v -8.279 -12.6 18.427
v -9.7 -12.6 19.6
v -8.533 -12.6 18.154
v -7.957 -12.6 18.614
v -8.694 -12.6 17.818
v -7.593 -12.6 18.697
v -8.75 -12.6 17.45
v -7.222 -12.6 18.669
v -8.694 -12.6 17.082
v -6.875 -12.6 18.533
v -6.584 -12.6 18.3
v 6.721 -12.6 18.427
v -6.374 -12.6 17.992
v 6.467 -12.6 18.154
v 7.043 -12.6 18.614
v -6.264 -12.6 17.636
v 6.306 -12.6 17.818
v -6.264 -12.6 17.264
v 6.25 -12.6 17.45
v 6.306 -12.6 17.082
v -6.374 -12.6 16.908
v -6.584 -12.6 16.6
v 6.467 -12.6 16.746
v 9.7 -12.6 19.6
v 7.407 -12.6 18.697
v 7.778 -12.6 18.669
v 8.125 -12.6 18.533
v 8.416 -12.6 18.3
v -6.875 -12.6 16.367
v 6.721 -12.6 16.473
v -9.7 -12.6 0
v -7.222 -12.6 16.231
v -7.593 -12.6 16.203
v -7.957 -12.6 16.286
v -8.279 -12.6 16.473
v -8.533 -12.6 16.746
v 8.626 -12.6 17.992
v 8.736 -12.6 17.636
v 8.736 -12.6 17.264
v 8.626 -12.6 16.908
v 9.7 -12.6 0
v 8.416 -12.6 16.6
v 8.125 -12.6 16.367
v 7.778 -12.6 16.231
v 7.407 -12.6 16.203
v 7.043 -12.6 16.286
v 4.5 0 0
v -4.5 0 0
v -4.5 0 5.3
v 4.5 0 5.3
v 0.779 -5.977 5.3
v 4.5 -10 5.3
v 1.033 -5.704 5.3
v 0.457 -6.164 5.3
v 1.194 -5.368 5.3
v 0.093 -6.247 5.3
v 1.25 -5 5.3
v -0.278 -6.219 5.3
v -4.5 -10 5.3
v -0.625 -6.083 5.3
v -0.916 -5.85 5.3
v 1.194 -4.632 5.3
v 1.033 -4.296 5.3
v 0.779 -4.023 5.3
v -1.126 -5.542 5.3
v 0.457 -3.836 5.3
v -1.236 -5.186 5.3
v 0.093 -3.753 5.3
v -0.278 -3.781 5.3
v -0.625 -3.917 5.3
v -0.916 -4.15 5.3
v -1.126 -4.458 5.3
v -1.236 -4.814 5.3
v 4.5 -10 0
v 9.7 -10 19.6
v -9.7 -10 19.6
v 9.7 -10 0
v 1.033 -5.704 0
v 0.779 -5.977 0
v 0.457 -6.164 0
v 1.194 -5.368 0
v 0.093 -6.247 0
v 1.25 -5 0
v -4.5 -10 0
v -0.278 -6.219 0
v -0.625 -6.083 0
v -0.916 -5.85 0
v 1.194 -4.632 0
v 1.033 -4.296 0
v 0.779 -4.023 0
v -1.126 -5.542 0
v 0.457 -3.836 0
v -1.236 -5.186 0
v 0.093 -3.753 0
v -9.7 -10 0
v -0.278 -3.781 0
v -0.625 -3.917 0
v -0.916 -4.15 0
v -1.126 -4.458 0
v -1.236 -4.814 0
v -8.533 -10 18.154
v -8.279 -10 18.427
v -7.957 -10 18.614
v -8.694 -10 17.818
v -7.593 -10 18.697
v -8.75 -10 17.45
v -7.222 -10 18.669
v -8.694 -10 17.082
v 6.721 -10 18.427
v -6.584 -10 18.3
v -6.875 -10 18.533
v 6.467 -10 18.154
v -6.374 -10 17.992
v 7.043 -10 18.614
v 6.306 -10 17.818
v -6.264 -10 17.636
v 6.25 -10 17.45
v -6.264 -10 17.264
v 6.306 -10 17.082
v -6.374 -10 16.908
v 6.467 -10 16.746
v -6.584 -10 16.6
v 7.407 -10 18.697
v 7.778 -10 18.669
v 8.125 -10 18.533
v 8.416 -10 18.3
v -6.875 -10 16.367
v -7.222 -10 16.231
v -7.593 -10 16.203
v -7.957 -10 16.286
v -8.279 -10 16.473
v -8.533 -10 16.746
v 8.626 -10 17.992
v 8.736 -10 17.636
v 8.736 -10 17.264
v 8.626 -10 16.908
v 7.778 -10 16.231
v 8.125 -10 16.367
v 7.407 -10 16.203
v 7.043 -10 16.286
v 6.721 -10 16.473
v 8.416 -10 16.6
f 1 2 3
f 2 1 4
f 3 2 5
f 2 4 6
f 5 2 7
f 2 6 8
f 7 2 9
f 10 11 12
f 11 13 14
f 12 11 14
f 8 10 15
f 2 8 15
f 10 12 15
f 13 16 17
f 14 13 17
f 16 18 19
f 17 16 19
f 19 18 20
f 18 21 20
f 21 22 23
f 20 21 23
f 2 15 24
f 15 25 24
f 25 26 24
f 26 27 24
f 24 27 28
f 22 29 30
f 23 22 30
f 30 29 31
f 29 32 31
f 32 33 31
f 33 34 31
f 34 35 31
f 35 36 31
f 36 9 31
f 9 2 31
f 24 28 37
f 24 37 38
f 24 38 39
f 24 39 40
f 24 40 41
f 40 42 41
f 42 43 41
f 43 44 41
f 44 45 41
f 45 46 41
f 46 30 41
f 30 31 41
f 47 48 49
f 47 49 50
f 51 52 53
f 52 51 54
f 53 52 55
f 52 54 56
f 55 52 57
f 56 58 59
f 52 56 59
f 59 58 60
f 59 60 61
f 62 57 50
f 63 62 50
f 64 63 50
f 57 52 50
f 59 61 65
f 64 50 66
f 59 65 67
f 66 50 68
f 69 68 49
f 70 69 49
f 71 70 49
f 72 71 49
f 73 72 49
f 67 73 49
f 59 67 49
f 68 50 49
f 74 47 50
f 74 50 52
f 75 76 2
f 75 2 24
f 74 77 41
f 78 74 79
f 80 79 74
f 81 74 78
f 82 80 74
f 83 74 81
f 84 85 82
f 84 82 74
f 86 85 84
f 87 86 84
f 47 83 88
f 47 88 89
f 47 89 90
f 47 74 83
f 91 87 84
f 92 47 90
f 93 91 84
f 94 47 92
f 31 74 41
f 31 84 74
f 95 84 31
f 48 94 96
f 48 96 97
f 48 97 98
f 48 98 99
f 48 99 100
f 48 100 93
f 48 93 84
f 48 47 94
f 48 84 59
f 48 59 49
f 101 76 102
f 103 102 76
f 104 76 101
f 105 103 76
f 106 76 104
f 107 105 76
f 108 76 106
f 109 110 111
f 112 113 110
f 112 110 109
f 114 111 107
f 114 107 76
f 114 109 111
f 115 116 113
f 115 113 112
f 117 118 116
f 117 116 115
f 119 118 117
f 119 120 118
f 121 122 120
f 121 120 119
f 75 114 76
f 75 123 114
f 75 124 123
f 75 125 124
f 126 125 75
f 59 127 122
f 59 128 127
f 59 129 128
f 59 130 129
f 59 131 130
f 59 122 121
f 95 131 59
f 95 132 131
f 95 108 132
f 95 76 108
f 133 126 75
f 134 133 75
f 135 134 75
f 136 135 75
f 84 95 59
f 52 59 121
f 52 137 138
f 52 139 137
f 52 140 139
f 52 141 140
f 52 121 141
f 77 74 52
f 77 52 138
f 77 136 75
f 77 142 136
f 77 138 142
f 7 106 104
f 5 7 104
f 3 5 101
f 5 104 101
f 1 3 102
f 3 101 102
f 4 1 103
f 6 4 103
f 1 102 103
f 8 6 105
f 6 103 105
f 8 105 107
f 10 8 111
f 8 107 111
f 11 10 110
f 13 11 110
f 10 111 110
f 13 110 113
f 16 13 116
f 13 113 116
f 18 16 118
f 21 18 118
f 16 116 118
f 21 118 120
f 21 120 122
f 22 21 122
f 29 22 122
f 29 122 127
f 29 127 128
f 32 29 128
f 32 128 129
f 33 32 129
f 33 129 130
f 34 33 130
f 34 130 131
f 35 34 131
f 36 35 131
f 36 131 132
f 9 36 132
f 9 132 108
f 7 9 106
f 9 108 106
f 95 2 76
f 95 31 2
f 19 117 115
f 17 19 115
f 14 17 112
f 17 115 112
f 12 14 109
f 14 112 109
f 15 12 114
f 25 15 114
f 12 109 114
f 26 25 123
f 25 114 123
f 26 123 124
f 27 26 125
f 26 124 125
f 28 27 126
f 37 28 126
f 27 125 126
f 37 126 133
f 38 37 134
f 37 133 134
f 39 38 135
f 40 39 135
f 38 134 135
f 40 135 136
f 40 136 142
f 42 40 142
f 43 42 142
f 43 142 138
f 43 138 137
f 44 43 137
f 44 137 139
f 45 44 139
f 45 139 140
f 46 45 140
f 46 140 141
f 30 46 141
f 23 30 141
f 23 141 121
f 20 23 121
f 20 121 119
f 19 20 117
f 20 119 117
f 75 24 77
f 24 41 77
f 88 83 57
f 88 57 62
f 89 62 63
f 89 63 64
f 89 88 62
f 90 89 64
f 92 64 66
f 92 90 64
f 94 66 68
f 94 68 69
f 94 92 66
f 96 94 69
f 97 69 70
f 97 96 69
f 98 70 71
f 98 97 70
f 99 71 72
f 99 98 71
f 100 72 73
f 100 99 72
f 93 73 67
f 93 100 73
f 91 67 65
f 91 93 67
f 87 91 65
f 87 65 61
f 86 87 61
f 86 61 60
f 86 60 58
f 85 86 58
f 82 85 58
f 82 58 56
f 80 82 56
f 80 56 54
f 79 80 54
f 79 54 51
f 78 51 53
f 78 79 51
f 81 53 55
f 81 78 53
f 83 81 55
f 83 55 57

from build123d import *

# Parameters (mm, degrees)
SKETCH029_R     = 1.25
PAD017_DEPTH    = 5.3
SKETCH030_W     = 19.4
SKETCH030_H     = 2.6
PAD018_DEPTH    = 14.3
SKETCH031_R     = 1.25
POCKET009_DEPTH = 2.6


with BuildPart() as part:
    # Sketch029 → Pad017 (new body)
    with BuildSketch(Plane.XY):
        Polygon((-4.5, 0), (4.5, 0), (4.5, -10), (9.7, -10), (9.7, -12.6), (-9.7, -12.6), (-9.7, -10), (-4.5, -10), align=None)
        with Locations((0, -5)):
            Circle(SKETCH029_R, mode=Mode.SUBTRACT)
    extrude(amount=PAD017_DEPTH)

    # Sketch030 (on Face11 of Pad017) → Pad018 (join)
    with BuildSketch(Plane.XY.offset(5.3)):
        with Locations((0, -11.3)):
            Rectangle(SKETCH030_W, SKETCH030_H)
    extrude(amount=PAD018_DEPTH)

    # Sketch031 (on Face7 of Pad018) → Pocket009 (cut)
    with BuildSketch(Plane(origin=(0, -10, 0), x_dir=(-1, 0, 0), z_dir=(0, 1, 0))):
        with Locations((-7.5, 17.45)):
            Circle(SKETCH031_R)
        with Locations((7.5, 17.45)):
            Circle(SKETCH031_R)
    extrude(amount=-POCKET009_DEPTH, mode=Mode.SUBTRACT)


solid = part.part
